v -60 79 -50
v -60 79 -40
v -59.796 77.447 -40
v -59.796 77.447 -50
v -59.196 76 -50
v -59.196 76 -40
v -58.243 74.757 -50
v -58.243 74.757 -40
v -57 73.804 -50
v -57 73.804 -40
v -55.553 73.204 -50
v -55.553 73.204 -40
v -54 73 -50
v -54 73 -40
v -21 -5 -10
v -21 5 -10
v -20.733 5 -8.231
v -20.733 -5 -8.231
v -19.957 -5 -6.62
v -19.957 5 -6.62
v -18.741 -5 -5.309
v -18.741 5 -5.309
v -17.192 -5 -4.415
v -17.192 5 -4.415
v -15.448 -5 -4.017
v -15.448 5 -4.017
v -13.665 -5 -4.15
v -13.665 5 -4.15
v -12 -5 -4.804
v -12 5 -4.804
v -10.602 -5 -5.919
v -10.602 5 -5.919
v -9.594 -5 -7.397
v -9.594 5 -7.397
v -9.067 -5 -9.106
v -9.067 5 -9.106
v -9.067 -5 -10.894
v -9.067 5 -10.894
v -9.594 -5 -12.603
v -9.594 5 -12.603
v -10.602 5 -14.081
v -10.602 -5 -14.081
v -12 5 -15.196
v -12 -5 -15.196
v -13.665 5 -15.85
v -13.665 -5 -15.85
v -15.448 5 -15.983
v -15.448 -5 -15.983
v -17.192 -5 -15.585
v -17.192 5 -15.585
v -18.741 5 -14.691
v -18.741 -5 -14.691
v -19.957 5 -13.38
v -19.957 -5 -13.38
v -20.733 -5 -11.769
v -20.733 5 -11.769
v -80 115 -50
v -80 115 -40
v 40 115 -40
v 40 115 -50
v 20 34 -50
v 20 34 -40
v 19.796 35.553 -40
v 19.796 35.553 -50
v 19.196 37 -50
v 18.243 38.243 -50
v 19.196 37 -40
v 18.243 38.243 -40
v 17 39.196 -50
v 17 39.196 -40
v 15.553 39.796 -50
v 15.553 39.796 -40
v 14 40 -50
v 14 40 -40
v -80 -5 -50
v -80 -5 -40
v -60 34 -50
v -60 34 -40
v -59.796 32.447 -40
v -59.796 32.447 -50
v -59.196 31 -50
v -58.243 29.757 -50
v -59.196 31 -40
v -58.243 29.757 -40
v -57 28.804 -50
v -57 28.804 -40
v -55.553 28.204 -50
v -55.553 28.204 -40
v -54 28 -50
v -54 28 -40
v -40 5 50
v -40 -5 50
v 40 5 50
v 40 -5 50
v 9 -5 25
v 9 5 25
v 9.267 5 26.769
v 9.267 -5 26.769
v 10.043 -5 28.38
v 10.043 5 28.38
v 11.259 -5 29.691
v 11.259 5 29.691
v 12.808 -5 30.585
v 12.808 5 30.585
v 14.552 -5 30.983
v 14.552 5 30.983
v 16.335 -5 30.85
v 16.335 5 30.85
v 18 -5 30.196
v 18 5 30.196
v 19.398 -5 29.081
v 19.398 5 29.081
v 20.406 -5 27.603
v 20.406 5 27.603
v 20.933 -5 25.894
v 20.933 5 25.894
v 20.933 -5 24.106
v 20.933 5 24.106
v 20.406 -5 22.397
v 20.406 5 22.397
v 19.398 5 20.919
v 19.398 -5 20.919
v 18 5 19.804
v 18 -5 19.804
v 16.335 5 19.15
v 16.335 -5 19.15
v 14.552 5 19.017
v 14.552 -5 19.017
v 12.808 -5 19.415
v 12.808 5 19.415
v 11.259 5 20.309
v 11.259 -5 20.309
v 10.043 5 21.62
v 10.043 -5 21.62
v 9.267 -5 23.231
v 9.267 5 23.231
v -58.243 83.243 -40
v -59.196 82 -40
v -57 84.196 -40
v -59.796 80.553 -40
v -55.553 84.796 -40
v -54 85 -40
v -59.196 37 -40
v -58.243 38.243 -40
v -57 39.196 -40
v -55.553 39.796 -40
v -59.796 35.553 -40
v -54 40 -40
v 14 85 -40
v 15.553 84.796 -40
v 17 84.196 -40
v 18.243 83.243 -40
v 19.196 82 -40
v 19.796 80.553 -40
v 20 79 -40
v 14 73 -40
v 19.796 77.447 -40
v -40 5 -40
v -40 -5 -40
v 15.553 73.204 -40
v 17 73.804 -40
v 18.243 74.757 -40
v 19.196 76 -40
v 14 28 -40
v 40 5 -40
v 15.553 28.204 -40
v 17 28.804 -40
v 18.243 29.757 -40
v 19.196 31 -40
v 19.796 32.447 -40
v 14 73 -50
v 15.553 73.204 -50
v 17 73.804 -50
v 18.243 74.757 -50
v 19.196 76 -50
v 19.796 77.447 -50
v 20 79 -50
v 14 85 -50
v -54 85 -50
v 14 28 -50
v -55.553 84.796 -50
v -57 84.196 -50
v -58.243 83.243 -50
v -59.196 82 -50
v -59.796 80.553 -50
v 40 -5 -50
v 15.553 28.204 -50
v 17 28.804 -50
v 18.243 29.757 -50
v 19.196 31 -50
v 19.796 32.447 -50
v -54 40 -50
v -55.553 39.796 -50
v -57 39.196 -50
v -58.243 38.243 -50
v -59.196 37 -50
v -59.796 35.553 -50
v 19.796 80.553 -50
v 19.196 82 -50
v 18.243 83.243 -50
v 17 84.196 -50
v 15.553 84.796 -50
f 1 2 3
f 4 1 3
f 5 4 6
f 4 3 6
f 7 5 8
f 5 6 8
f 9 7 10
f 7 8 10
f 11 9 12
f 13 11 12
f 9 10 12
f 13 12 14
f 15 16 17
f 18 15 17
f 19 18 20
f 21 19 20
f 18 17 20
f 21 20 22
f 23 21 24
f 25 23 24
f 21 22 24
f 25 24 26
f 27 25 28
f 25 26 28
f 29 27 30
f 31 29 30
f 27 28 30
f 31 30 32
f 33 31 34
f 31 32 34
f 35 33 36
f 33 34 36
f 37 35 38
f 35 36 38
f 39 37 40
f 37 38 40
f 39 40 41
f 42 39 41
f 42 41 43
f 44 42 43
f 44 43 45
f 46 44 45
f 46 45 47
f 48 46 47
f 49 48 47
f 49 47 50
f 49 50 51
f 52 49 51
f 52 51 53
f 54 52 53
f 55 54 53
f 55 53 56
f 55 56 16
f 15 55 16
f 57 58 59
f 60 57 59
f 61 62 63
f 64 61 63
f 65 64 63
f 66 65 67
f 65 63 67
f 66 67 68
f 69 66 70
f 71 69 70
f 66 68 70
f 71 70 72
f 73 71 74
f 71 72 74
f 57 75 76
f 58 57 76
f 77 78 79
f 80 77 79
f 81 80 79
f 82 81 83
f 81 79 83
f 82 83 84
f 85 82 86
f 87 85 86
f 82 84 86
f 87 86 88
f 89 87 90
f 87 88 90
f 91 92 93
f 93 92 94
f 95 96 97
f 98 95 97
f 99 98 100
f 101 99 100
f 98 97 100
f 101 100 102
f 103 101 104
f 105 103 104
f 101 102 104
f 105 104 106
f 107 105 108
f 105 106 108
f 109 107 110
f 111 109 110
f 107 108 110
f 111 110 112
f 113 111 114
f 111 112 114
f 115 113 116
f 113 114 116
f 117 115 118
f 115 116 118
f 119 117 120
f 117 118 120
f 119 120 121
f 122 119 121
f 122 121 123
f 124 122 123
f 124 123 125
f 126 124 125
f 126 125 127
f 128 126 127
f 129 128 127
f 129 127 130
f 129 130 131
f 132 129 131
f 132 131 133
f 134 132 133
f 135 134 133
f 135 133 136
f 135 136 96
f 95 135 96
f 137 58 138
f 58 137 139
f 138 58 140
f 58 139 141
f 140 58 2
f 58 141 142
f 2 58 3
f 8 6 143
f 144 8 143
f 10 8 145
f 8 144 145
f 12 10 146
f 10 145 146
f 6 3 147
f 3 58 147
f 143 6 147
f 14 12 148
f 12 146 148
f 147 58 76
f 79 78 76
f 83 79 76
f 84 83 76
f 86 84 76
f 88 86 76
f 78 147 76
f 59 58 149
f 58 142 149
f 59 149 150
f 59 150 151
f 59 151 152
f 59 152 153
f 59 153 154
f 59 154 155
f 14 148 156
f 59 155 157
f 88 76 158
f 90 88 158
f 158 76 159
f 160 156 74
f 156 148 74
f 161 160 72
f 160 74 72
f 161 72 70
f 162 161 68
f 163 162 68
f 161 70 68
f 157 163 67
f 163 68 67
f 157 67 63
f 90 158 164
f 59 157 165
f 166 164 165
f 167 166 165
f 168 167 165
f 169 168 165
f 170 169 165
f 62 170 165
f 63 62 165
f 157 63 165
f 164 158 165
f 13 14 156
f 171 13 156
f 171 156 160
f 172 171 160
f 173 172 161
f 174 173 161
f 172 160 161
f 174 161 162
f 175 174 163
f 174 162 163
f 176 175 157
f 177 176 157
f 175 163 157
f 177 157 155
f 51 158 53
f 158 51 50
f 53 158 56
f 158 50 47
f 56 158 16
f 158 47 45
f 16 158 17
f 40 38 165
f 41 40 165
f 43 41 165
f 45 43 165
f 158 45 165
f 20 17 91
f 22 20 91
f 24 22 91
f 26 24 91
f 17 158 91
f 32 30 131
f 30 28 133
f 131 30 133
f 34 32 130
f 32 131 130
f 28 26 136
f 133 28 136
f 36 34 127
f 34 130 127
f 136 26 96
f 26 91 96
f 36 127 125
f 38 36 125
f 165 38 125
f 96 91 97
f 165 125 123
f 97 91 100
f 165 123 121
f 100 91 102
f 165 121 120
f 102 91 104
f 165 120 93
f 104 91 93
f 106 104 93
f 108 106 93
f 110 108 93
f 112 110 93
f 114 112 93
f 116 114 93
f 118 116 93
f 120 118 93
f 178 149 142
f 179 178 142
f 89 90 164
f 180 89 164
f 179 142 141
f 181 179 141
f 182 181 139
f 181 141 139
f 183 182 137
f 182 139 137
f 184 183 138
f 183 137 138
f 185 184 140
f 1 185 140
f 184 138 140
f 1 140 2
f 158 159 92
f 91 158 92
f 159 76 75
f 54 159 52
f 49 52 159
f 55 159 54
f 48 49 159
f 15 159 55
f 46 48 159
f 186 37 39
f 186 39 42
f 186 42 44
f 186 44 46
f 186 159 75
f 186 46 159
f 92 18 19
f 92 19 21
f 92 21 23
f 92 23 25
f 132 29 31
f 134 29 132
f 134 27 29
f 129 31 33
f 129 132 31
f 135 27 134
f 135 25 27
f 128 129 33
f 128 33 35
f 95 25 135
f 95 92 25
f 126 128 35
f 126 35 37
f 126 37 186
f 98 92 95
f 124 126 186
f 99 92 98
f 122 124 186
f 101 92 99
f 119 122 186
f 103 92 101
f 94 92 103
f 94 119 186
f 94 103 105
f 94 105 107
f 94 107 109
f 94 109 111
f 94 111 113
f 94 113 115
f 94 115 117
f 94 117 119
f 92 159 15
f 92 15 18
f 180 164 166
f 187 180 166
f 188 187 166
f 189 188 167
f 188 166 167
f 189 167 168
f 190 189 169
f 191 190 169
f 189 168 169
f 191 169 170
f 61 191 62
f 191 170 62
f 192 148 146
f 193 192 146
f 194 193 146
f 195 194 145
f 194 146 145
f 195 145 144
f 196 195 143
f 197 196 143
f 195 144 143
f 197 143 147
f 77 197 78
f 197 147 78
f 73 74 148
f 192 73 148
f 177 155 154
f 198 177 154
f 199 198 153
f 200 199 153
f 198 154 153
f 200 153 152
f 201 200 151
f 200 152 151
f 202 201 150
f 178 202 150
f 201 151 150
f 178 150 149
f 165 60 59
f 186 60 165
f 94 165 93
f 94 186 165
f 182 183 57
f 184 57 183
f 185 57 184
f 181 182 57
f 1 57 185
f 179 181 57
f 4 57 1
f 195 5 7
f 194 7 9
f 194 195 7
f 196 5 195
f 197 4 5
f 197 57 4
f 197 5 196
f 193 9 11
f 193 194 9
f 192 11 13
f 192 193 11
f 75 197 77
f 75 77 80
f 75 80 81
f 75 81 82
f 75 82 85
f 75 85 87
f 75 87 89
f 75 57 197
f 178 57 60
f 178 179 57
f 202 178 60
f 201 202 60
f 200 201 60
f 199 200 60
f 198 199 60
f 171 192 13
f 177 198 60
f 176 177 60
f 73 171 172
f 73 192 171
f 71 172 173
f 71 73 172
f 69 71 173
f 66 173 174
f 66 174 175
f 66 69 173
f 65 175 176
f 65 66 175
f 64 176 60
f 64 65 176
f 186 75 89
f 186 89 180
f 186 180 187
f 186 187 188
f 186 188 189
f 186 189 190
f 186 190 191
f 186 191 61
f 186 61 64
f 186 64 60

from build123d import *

# Parameters (mm, degrees)
F0_W     = 80
F0_H     = 100
F1_DEPTH = 5
F2_W     = 120
F2_H     = 10
F3_DEPTH = 120
F5_DEPTH = 25
F6_R     = 6
F7_DEPTH = 25


with BuildPart() as f1:
    # F0 (on Front) → F1 (new body, symmetric)
    with BuildSketch(Plane.XZ):
        Rectangle(F0_W, F0_H)
    extrude(amount=F1_DEPTH, both=True)

    # F2 (on face) → F3 (join)
    with BuildSketch(Plane.XZ.offset(5)):
        with Locations((-20, -45)):
            Rectangle(F2_W, F2_H)
    extrude(amount=-F3_DEPTH)

    # F4 (on face) → F5 (cut)
    with BuildSketch(Plane.XY.offset(-40)):
        with BuildLine():
            ThreePointArc((20, 79), (18.242641, 83.242641), (14, 85))
            Line((14, 85), (-54, 85))
            ThreePointArc((-54, 85), (-58.242641, 83.242641), (-60, 79))
            ThreePointArc((-60, 79), (-58.242641, 74.757359), (-54, 73))
            Line((-54, 73), (14, 73))
            ThreePointArc((14, 73), (18.242641, 74.757359), (20, 79))
        make_face()
        with BuildLine():
            Line((-54, 28), (14, 28))
            ThreePointArc((14, 28), (18.242641, 29.757359), (20, 34))
            ThreePointArc((20, 34), (18.242641, 38.242641), (14, 40))
            Line((14, 40), (-54, 40))
            ThreePointArc((-54, 40), (-58.242641, 38.242641), (-60, 34))
            ThreePointArc((-60, 34), (-58.242641, 29.757359), (-54, 28))
        make_face()
    extrude(amount=-F5_DEPTH, mode=Mode.SUBTRACT)

    # F6 (on face) → F7 (cut)
    with BuildSketch(Plane(origin=(0, 5, 0), x_dir=(-1, 0, 0), z_dir=(0, 1, 0))):
        with Locations((-15, 25)):
            Circle(F6_R)
        with Locations((15, -10)):
            Circle(F6_R)
    extrude(amount=-F7_DEPTH, mode=Mode.SUBTRACT)


solid = f1.part
